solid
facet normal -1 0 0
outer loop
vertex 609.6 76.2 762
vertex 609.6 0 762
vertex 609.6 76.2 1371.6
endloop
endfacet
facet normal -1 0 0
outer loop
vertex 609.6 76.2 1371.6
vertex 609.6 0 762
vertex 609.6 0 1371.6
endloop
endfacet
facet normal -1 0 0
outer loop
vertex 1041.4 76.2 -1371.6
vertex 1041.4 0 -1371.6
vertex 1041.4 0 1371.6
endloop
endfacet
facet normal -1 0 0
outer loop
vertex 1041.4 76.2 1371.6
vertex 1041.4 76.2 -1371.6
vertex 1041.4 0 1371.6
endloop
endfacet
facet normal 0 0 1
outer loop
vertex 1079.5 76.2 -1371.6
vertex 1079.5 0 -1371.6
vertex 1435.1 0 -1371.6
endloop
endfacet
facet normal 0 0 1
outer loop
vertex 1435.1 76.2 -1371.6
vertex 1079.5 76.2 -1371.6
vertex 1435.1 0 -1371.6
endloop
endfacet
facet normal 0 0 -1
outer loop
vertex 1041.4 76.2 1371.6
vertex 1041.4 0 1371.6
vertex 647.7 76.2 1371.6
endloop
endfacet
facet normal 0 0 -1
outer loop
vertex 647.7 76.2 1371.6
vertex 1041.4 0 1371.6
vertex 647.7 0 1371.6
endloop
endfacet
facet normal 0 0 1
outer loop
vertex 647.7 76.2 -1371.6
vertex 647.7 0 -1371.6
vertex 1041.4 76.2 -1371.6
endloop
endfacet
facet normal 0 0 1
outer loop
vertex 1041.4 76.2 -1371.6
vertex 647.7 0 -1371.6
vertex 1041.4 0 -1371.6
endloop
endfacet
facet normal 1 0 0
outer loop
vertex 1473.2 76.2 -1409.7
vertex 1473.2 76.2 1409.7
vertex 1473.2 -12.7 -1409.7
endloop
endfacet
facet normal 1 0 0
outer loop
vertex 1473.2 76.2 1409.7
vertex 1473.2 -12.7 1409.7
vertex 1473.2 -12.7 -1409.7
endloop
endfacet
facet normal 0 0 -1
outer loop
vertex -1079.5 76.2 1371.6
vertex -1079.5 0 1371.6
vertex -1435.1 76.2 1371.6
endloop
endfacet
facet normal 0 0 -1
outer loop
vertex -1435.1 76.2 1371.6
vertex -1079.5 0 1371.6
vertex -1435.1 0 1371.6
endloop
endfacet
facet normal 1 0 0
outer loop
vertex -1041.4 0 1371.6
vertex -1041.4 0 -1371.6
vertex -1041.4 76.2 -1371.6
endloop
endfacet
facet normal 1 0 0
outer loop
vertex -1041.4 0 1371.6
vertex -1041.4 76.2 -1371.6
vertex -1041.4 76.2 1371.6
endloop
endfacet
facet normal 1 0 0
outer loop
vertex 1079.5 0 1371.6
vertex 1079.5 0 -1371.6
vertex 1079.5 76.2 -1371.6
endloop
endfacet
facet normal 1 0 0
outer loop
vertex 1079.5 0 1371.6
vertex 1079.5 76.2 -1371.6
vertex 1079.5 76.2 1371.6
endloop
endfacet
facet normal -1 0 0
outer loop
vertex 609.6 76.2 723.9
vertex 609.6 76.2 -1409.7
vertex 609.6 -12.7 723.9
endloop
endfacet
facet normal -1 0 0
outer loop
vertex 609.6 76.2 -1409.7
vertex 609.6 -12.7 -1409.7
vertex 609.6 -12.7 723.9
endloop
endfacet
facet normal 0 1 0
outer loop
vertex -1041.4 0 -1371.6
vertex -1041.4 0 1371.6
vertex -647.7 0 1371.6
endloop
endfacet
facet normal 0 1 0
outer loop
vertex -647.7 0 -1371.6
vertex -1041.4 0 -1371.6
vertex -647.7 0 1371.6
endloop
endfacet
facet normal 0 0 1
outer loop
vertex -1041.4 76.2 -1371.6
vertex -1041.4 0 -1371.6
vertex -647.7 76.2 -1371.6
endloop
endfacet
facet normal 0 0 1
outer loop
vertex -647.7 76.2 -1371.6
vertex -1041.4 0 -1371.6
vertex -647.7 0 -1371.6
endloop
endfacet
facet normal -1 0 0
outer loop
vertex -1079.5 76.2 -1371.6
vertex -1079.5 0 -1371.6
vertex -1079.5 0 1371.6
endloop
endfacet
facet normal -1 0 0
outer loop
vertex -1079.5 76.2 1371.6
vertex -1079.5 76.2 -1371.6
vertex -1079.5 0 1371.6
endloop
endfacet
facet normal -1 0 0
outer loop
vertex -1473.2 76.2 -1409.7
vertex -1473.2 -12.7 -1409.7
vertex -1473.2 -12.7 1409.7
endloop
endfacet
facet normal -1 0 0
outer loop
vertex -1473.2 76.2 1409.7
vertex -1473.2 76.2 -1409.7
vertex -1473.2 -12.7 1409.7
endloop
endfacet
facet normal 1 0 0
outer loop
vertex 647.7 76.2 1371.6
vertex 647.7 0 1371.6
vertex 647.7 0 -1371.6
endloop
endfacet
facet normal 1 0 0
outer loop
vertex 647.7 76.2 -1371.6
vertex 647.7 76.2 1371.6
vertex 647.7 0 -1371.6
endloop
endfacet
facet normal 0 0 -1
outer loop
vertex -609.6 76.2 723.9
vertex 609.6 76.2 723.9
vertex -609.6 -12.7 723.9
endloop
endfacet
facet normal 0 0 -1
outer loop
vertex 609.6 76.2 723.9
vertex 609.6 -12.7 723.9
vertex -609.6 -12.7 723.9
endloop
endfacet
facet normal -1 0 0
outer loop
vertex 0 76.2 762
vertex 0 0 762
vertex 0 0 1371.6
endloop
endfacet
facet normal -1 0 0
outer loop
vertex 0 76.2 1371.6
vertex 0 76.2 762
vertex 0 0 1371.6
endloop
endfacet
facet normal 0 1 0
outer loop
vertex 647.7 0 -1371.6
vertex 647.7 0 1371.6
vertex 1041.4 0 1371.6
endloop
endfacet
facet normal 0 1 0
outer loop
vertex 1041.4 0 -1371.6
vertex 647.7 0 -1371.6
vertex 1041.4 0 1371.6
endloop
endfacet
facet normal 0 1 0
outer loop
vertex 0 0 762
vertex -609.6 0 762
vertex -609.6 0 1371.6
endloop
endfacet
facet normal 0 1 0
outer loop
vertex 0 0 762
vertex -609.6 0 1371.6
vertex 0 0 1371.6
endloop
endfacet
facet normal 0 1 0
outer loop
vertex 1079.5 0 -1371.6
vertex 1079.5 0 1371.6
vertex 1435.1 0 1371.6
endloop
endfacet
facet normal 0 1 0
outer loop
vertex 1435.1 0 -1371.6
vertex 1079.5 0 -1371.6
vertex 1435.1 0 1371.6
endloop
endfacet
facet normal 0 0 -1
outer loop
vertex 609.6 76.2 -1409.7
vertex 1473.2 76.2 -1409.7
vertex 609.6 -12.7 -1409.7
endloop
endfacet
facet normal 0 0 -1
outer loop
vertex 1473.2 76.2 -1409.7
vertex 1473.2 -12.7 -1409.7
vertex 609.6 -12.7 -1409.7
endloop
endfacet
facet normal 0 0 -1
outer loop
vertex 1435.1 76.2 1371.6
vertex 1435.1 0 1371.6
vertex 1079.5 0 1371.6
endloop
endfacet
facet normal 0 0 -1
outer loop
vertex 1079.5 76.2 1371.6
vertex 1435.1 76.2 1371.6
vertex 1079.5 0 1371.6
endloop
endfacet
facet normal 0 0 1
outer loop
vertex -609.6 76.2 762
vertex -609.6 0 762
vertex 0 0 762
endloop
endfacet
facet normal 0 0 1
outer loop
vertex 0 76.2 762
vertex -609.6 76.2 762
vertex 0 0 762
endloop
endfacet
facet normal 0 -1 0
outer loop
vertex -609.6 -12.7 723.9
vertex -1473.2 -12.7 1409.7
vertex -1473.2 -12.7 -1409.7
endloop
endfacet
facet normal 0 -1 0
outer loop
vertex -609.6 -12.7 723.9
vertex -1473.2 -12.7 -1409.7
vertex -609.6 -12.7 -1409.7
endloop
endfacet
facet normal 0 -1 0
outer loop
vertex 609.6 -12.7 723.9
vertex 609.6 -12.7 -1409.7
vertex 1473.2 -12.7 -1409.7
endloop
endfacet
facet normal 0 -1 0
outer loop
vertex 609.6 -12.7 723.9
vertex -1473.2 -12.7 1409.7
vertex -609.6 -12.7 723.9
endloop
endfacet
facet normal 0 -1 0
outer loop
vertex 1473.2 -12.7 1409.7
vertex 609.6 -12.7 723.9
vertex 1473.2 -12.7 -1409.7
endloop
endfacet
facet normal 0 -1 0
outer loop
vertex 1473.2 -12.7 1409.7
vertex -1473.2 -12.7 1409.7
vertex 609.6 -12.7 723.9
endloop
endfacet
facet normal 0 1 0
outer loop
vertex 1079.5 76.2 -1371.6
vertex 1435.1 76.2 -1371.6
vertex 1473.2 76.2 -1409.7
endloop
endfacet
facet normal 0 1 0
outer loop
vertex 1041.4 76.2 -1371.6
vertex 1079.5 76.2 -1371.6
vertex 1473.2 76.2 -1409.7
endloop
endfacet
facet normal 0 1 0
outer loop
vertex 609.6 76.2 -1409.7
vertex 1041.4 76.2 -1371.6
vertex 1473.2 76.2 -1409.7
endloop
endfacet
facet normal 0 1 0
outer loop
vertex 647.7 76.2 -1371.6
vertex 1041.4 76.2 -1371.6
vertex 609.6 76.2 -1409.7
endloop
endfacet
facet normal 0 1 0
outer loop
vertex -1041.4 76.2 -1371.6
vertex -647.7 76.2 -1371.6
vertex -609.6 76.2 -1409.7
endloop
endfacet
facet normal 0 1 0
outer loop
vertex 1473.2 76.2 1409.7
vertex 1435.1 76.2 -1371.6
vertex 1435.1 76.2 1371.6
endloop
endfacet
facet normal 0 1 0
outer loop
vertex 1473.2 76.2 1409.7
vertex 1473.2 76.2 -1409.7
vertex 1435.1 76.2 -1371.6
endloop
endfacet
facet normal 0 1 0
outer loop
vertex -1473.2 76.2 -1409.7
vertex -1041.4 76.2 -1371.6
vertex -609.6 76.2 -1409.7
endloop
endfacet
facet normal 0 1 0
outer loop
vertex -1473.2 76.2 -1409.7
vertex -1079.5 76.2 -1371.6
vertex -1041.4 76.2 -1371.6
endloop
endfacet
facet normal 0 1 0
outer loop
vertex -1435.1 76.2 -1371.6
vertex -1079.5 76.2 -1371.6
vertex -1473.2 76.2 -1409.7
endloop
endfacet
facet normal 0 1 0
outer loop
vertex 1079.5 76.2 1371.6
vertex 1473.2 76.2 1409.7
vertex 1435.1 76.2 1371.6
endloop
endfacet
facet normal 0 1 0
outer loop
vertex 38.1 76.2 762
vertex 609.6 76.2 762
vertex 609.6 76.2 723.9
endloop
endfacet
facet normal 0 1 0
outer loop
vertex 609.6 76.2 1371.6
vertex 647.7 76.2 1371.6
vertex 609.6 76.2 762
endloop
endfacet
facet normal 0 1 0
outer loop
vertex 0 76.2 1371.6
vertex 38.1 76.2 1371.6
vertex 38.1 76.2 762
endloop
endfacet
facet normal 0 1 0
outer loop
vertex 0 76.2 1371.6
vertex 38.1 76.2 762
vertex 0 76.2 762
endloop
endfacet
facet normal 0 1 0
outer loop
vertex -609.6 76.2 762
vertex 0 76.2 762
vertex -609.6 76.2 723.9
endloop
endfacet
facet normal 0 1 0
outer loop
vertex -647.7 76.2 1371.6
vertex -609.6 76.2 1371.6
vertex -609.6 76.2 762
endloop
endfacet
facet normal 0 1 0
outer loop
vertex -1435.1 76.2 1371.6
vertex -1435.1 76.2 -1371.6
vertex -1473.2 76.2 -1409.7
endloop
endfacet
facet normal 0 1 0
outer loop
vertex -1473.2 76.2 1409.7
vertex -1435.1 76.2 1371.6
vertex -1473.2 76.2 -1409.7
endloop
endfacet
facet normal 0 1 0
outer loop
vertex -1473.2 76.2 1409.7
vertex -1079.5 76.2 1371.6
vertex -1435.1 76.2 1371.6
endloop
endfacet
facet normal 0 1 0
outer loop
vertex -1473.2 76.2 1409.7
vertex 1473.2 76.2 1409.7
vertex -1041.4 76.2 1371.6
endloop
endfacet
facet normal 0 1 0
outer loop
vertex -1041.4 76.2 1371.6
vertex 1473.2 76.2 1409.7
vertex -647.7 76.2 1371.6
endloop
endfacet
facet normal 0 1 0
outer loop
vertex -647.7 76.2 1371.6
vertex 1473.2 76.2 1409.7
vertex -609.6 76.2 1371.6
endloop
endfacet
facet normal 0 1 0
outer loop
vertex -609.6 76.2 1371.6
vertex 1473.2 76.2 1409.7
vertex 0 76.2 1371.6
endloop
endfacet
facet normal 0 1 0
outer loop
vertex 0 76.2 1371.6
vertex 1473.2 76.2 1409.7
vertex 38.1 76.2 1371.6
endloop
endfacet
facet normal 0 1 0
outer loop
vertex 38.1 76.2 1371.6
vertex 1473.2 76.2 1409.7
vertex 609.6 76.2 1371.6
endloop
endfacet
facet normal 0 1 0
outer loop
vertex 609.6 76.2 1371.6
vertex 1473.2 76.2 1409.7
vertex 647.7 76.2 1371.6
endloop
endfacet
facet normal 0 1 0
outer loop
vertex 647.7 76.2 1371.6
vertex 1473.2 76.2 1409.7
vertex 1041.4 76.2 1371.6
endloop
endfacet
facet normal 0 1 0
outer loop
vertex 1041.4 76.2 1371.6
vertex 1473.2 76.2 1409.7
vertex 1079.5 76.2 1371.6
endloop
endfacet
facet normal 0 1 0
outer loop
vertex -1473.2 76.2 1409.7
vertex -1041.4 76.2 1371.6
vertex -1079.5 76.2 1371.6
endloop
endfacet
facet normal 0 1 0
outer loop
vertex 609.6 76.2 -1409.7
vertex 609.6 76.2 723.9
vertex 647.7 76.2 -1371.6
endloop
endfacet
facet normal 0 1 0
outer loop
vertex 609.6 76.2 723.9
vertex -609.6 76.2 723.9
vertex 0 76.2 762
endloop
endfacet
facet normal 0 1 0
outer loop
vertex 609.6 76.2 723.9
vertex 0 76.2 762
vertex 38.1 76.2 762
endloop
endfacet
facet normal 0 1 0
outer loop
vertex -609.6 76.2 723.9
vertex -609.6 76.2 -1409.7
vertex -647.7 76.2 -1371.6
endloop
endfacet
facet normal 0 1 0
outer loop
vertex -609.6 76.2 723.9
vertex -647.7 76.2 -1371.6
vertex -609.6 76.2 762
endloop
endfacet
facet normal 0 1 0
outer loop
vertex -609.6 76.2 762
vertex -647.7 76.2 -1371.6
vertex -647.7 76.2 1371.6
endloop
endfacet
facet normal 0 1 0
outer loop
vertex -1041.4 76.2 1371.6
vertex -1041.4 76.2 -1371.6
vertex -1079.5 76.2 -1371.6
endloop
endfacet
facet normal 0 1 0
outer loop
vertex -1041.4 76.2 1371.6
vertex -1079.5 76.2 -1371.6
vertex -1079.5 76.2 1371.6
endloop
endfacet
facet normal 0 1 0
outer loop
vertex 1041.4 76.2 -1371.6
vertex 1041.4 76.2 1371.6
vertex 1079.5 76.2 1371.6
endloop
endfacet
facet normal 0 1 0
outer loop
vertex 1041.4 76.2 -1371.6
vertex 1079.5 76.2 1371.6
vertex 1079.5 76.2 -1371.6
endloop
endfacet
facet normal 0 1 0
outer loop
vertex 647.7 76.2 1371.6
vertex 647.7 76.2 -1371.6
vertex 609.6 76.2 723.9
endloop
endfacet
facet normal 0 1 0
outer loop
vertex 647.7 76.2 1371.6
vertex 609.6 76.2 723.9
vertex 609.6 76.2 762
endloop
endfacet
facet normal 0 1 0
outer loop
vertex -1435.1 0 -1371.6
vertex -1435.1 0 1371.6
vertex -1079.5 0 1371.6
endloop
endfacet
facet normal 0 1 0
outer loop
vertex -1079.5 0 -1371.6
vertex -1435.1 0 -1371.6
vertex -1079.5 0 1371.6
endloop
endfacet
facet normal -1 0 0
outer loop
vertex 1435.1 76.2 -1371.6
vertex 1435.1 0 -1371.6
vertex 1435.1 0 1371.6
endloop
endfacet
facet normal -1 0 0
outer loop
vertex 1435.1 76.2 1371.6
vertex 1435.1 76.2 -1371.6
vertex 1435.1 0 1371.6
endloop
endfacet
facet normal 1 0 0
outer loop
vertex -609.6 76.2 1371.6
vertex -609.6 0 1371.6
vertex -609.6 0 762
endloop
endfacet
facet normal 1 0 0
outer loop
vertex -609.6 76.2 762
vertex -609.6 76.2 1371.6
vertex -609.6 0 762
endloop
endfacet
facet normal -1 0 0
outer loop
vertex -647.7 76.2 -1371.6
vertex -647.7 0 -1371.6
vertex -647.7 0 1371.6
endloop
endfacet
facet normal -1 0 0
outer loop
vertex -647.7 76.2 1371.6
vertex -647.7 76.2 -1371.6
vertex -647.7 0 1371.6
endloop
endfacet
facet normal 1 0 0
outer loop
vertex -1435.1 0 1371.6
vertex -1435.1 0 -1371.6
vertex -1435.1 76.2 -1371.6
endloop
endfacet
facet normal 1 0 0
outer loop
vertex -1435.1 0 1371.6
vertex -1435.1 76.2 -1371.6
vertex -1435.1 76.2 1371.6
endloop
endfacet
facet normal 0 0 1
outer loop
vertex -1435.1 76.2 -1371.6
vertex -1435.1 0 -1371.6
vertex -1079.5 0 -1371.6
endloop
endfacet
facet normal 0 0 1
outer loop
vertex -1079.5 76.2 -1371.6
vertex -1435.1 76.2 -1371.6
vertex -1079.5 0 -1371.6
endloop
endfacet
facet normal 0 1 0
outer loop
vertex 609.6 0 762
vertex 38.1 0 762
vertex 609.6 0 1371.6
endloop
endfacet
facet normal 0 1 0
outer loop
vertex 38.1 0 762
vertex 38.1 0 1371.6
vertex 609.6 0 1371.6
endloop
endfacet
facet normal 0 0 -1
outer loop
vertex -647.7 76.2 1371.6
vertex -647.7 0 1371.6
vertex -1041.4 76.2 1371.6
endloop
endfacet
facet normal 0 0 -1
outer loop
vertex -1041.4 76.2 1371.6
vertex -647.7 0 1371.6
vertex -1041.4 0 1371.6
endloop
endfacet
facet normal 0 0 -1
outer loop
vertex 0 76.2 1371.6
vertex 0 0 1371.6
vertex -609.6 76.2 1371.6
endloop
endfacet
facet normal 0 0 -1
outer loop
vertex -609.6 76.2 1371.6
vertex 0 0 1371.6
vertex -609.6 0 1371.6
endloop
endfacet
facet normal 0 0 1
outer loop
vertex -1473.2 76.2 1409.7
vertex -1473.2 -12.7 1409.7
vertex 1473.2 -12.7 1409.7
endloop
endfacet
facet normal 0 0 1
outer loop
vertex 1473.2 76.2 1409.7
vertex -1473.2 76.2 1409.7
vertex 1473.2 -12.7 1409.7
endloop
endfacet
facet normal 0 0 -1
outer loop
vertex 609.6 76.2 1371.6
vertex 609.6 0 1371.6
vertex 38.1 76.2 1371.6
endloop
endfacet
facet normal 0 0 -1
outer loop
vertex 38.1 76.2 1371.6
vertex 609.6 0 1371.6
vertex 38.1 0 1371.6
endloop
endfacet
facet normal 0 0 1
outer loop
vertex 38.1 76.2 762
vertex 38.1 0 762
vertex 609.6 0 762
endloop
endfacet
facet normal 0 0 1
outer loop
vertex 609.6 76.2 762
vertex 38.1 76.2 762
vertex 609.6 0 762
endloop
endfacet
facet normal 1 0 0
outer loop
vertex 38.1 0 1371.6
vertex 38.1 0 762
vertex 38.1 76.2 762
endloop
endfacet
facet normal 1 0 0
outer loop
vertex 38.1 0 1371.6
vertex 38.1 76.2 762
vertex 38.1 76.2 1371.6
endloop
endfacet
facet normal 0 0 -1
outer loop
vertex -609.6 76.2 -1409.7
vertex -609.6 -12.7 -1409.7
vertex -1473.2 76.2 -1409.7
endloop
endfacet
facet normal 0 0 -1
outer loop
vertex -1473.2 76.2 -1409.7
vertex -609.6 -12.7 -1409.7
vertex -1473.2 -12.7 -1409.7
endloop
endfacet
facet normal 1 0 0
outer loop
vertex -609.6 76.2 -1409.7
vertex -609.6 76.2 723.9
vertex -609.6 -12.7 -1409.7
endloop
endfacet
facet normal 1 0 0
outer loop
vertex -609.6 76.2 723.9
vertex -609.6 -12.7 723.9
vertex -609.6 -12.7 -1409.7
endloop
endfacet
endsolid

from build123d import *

# Parameters (mm, degrees)
F1_DEPTH = 12.7
F2_W     = 38.1
F2_H     = 2743.2
F2_H_2   = 609.6
F3_DEPTH = 76.2


with BuildPart() as f1:
    # F0 (on Front) → F1 (new body)
    with BuildSketch(Plane.XZ):
        Polygon((1473.2, -1409.7), (1473.2, 1409.7), (-1473.2, 1409.7), (-1473.2, -1409.7), (-609.6, -1409.7), (-609.6, 723.9), (609.6, 723.9), (609.6, -1409.7), align=None)
    extrude(amount=F1_DEPTH)

    # F2 (on face) → F3 (join)
    with BuildSketch(Plane(origin=(0, 0, 0), x_dir=(-1, 0, 0), z_dir=(0, 1, 0))):
        Polygon((1473.2, 1409.7), (-1473.2, 1409.7), (-1473.2, 1371.6), (-1435.1, 1371.6), (-1079.5, 1371.6), (-1041.4, 1371.6), (-647.7, 1371.6), (-609.6, 1371.6), (-38.1, 1371.6), (0, 1371.6), (609.6, 1371.6), (647.7, 1371.6), (1041.4, 1371.6), (1079.5, 1371.6), (1435.1, 1371.6), (1473.2, 1371.6), align=None)
        with Locations((-1454.15, 0)):
            Rectangle(F2_W, F2_H)
        with Locations((1454.15, 0)):
            Rectangle(F2_W, F2_H)
        Polygon((-1435.1, -1371.6), (-1473.2, -1371.6), (-1473.2, -1409.7), (-609.6, -1409.7), (-609.6, -1371.6), (-647.7, -1371.6), (-1041.4, -1371.6), (-1079.5, -1371.6), align=None)
        Polygon((1473.2, -1409.7), (1473.2, -1371.6), (1435.1, -1371.6), (1079.5, -1371.6), (1041.4, -1371.6), (647.7, -1371.6), (609.6, -1371.6), (609.6, -1409.7), align=None)
        Polygon((-609.6, 1371.6), (-647.7, 1371.6), (-647.7, -1371.6), (-609.6, -1371.6), (-609.6, 723.9), (-609.6, 762), align=None)
        Polygon((647.7, -1371.6), (647.7, 1371.6), (609.6, 1371.6), (609.6, 762), (609.6, 723.9), (609.6, -1371.6), align=None)
        Polygon((-609.6, 762), (-609.6, 723.9), (609.6, 723.9), (609.6, 762), (0, 762), (-38.1, 762), align=None)
        with Locations((-1060.45, 0)):
            Rectangle(F2_W, F2_H)
        with Locations((1060.45, 0)):
            Rectangle(F2_W, F2_H)
        with Locations((-19.05, 1066.8)):
            Rectangle(F2_W, F2_H_2)
    extrude(amount=F3_DEPTH)


solid = f1.part
